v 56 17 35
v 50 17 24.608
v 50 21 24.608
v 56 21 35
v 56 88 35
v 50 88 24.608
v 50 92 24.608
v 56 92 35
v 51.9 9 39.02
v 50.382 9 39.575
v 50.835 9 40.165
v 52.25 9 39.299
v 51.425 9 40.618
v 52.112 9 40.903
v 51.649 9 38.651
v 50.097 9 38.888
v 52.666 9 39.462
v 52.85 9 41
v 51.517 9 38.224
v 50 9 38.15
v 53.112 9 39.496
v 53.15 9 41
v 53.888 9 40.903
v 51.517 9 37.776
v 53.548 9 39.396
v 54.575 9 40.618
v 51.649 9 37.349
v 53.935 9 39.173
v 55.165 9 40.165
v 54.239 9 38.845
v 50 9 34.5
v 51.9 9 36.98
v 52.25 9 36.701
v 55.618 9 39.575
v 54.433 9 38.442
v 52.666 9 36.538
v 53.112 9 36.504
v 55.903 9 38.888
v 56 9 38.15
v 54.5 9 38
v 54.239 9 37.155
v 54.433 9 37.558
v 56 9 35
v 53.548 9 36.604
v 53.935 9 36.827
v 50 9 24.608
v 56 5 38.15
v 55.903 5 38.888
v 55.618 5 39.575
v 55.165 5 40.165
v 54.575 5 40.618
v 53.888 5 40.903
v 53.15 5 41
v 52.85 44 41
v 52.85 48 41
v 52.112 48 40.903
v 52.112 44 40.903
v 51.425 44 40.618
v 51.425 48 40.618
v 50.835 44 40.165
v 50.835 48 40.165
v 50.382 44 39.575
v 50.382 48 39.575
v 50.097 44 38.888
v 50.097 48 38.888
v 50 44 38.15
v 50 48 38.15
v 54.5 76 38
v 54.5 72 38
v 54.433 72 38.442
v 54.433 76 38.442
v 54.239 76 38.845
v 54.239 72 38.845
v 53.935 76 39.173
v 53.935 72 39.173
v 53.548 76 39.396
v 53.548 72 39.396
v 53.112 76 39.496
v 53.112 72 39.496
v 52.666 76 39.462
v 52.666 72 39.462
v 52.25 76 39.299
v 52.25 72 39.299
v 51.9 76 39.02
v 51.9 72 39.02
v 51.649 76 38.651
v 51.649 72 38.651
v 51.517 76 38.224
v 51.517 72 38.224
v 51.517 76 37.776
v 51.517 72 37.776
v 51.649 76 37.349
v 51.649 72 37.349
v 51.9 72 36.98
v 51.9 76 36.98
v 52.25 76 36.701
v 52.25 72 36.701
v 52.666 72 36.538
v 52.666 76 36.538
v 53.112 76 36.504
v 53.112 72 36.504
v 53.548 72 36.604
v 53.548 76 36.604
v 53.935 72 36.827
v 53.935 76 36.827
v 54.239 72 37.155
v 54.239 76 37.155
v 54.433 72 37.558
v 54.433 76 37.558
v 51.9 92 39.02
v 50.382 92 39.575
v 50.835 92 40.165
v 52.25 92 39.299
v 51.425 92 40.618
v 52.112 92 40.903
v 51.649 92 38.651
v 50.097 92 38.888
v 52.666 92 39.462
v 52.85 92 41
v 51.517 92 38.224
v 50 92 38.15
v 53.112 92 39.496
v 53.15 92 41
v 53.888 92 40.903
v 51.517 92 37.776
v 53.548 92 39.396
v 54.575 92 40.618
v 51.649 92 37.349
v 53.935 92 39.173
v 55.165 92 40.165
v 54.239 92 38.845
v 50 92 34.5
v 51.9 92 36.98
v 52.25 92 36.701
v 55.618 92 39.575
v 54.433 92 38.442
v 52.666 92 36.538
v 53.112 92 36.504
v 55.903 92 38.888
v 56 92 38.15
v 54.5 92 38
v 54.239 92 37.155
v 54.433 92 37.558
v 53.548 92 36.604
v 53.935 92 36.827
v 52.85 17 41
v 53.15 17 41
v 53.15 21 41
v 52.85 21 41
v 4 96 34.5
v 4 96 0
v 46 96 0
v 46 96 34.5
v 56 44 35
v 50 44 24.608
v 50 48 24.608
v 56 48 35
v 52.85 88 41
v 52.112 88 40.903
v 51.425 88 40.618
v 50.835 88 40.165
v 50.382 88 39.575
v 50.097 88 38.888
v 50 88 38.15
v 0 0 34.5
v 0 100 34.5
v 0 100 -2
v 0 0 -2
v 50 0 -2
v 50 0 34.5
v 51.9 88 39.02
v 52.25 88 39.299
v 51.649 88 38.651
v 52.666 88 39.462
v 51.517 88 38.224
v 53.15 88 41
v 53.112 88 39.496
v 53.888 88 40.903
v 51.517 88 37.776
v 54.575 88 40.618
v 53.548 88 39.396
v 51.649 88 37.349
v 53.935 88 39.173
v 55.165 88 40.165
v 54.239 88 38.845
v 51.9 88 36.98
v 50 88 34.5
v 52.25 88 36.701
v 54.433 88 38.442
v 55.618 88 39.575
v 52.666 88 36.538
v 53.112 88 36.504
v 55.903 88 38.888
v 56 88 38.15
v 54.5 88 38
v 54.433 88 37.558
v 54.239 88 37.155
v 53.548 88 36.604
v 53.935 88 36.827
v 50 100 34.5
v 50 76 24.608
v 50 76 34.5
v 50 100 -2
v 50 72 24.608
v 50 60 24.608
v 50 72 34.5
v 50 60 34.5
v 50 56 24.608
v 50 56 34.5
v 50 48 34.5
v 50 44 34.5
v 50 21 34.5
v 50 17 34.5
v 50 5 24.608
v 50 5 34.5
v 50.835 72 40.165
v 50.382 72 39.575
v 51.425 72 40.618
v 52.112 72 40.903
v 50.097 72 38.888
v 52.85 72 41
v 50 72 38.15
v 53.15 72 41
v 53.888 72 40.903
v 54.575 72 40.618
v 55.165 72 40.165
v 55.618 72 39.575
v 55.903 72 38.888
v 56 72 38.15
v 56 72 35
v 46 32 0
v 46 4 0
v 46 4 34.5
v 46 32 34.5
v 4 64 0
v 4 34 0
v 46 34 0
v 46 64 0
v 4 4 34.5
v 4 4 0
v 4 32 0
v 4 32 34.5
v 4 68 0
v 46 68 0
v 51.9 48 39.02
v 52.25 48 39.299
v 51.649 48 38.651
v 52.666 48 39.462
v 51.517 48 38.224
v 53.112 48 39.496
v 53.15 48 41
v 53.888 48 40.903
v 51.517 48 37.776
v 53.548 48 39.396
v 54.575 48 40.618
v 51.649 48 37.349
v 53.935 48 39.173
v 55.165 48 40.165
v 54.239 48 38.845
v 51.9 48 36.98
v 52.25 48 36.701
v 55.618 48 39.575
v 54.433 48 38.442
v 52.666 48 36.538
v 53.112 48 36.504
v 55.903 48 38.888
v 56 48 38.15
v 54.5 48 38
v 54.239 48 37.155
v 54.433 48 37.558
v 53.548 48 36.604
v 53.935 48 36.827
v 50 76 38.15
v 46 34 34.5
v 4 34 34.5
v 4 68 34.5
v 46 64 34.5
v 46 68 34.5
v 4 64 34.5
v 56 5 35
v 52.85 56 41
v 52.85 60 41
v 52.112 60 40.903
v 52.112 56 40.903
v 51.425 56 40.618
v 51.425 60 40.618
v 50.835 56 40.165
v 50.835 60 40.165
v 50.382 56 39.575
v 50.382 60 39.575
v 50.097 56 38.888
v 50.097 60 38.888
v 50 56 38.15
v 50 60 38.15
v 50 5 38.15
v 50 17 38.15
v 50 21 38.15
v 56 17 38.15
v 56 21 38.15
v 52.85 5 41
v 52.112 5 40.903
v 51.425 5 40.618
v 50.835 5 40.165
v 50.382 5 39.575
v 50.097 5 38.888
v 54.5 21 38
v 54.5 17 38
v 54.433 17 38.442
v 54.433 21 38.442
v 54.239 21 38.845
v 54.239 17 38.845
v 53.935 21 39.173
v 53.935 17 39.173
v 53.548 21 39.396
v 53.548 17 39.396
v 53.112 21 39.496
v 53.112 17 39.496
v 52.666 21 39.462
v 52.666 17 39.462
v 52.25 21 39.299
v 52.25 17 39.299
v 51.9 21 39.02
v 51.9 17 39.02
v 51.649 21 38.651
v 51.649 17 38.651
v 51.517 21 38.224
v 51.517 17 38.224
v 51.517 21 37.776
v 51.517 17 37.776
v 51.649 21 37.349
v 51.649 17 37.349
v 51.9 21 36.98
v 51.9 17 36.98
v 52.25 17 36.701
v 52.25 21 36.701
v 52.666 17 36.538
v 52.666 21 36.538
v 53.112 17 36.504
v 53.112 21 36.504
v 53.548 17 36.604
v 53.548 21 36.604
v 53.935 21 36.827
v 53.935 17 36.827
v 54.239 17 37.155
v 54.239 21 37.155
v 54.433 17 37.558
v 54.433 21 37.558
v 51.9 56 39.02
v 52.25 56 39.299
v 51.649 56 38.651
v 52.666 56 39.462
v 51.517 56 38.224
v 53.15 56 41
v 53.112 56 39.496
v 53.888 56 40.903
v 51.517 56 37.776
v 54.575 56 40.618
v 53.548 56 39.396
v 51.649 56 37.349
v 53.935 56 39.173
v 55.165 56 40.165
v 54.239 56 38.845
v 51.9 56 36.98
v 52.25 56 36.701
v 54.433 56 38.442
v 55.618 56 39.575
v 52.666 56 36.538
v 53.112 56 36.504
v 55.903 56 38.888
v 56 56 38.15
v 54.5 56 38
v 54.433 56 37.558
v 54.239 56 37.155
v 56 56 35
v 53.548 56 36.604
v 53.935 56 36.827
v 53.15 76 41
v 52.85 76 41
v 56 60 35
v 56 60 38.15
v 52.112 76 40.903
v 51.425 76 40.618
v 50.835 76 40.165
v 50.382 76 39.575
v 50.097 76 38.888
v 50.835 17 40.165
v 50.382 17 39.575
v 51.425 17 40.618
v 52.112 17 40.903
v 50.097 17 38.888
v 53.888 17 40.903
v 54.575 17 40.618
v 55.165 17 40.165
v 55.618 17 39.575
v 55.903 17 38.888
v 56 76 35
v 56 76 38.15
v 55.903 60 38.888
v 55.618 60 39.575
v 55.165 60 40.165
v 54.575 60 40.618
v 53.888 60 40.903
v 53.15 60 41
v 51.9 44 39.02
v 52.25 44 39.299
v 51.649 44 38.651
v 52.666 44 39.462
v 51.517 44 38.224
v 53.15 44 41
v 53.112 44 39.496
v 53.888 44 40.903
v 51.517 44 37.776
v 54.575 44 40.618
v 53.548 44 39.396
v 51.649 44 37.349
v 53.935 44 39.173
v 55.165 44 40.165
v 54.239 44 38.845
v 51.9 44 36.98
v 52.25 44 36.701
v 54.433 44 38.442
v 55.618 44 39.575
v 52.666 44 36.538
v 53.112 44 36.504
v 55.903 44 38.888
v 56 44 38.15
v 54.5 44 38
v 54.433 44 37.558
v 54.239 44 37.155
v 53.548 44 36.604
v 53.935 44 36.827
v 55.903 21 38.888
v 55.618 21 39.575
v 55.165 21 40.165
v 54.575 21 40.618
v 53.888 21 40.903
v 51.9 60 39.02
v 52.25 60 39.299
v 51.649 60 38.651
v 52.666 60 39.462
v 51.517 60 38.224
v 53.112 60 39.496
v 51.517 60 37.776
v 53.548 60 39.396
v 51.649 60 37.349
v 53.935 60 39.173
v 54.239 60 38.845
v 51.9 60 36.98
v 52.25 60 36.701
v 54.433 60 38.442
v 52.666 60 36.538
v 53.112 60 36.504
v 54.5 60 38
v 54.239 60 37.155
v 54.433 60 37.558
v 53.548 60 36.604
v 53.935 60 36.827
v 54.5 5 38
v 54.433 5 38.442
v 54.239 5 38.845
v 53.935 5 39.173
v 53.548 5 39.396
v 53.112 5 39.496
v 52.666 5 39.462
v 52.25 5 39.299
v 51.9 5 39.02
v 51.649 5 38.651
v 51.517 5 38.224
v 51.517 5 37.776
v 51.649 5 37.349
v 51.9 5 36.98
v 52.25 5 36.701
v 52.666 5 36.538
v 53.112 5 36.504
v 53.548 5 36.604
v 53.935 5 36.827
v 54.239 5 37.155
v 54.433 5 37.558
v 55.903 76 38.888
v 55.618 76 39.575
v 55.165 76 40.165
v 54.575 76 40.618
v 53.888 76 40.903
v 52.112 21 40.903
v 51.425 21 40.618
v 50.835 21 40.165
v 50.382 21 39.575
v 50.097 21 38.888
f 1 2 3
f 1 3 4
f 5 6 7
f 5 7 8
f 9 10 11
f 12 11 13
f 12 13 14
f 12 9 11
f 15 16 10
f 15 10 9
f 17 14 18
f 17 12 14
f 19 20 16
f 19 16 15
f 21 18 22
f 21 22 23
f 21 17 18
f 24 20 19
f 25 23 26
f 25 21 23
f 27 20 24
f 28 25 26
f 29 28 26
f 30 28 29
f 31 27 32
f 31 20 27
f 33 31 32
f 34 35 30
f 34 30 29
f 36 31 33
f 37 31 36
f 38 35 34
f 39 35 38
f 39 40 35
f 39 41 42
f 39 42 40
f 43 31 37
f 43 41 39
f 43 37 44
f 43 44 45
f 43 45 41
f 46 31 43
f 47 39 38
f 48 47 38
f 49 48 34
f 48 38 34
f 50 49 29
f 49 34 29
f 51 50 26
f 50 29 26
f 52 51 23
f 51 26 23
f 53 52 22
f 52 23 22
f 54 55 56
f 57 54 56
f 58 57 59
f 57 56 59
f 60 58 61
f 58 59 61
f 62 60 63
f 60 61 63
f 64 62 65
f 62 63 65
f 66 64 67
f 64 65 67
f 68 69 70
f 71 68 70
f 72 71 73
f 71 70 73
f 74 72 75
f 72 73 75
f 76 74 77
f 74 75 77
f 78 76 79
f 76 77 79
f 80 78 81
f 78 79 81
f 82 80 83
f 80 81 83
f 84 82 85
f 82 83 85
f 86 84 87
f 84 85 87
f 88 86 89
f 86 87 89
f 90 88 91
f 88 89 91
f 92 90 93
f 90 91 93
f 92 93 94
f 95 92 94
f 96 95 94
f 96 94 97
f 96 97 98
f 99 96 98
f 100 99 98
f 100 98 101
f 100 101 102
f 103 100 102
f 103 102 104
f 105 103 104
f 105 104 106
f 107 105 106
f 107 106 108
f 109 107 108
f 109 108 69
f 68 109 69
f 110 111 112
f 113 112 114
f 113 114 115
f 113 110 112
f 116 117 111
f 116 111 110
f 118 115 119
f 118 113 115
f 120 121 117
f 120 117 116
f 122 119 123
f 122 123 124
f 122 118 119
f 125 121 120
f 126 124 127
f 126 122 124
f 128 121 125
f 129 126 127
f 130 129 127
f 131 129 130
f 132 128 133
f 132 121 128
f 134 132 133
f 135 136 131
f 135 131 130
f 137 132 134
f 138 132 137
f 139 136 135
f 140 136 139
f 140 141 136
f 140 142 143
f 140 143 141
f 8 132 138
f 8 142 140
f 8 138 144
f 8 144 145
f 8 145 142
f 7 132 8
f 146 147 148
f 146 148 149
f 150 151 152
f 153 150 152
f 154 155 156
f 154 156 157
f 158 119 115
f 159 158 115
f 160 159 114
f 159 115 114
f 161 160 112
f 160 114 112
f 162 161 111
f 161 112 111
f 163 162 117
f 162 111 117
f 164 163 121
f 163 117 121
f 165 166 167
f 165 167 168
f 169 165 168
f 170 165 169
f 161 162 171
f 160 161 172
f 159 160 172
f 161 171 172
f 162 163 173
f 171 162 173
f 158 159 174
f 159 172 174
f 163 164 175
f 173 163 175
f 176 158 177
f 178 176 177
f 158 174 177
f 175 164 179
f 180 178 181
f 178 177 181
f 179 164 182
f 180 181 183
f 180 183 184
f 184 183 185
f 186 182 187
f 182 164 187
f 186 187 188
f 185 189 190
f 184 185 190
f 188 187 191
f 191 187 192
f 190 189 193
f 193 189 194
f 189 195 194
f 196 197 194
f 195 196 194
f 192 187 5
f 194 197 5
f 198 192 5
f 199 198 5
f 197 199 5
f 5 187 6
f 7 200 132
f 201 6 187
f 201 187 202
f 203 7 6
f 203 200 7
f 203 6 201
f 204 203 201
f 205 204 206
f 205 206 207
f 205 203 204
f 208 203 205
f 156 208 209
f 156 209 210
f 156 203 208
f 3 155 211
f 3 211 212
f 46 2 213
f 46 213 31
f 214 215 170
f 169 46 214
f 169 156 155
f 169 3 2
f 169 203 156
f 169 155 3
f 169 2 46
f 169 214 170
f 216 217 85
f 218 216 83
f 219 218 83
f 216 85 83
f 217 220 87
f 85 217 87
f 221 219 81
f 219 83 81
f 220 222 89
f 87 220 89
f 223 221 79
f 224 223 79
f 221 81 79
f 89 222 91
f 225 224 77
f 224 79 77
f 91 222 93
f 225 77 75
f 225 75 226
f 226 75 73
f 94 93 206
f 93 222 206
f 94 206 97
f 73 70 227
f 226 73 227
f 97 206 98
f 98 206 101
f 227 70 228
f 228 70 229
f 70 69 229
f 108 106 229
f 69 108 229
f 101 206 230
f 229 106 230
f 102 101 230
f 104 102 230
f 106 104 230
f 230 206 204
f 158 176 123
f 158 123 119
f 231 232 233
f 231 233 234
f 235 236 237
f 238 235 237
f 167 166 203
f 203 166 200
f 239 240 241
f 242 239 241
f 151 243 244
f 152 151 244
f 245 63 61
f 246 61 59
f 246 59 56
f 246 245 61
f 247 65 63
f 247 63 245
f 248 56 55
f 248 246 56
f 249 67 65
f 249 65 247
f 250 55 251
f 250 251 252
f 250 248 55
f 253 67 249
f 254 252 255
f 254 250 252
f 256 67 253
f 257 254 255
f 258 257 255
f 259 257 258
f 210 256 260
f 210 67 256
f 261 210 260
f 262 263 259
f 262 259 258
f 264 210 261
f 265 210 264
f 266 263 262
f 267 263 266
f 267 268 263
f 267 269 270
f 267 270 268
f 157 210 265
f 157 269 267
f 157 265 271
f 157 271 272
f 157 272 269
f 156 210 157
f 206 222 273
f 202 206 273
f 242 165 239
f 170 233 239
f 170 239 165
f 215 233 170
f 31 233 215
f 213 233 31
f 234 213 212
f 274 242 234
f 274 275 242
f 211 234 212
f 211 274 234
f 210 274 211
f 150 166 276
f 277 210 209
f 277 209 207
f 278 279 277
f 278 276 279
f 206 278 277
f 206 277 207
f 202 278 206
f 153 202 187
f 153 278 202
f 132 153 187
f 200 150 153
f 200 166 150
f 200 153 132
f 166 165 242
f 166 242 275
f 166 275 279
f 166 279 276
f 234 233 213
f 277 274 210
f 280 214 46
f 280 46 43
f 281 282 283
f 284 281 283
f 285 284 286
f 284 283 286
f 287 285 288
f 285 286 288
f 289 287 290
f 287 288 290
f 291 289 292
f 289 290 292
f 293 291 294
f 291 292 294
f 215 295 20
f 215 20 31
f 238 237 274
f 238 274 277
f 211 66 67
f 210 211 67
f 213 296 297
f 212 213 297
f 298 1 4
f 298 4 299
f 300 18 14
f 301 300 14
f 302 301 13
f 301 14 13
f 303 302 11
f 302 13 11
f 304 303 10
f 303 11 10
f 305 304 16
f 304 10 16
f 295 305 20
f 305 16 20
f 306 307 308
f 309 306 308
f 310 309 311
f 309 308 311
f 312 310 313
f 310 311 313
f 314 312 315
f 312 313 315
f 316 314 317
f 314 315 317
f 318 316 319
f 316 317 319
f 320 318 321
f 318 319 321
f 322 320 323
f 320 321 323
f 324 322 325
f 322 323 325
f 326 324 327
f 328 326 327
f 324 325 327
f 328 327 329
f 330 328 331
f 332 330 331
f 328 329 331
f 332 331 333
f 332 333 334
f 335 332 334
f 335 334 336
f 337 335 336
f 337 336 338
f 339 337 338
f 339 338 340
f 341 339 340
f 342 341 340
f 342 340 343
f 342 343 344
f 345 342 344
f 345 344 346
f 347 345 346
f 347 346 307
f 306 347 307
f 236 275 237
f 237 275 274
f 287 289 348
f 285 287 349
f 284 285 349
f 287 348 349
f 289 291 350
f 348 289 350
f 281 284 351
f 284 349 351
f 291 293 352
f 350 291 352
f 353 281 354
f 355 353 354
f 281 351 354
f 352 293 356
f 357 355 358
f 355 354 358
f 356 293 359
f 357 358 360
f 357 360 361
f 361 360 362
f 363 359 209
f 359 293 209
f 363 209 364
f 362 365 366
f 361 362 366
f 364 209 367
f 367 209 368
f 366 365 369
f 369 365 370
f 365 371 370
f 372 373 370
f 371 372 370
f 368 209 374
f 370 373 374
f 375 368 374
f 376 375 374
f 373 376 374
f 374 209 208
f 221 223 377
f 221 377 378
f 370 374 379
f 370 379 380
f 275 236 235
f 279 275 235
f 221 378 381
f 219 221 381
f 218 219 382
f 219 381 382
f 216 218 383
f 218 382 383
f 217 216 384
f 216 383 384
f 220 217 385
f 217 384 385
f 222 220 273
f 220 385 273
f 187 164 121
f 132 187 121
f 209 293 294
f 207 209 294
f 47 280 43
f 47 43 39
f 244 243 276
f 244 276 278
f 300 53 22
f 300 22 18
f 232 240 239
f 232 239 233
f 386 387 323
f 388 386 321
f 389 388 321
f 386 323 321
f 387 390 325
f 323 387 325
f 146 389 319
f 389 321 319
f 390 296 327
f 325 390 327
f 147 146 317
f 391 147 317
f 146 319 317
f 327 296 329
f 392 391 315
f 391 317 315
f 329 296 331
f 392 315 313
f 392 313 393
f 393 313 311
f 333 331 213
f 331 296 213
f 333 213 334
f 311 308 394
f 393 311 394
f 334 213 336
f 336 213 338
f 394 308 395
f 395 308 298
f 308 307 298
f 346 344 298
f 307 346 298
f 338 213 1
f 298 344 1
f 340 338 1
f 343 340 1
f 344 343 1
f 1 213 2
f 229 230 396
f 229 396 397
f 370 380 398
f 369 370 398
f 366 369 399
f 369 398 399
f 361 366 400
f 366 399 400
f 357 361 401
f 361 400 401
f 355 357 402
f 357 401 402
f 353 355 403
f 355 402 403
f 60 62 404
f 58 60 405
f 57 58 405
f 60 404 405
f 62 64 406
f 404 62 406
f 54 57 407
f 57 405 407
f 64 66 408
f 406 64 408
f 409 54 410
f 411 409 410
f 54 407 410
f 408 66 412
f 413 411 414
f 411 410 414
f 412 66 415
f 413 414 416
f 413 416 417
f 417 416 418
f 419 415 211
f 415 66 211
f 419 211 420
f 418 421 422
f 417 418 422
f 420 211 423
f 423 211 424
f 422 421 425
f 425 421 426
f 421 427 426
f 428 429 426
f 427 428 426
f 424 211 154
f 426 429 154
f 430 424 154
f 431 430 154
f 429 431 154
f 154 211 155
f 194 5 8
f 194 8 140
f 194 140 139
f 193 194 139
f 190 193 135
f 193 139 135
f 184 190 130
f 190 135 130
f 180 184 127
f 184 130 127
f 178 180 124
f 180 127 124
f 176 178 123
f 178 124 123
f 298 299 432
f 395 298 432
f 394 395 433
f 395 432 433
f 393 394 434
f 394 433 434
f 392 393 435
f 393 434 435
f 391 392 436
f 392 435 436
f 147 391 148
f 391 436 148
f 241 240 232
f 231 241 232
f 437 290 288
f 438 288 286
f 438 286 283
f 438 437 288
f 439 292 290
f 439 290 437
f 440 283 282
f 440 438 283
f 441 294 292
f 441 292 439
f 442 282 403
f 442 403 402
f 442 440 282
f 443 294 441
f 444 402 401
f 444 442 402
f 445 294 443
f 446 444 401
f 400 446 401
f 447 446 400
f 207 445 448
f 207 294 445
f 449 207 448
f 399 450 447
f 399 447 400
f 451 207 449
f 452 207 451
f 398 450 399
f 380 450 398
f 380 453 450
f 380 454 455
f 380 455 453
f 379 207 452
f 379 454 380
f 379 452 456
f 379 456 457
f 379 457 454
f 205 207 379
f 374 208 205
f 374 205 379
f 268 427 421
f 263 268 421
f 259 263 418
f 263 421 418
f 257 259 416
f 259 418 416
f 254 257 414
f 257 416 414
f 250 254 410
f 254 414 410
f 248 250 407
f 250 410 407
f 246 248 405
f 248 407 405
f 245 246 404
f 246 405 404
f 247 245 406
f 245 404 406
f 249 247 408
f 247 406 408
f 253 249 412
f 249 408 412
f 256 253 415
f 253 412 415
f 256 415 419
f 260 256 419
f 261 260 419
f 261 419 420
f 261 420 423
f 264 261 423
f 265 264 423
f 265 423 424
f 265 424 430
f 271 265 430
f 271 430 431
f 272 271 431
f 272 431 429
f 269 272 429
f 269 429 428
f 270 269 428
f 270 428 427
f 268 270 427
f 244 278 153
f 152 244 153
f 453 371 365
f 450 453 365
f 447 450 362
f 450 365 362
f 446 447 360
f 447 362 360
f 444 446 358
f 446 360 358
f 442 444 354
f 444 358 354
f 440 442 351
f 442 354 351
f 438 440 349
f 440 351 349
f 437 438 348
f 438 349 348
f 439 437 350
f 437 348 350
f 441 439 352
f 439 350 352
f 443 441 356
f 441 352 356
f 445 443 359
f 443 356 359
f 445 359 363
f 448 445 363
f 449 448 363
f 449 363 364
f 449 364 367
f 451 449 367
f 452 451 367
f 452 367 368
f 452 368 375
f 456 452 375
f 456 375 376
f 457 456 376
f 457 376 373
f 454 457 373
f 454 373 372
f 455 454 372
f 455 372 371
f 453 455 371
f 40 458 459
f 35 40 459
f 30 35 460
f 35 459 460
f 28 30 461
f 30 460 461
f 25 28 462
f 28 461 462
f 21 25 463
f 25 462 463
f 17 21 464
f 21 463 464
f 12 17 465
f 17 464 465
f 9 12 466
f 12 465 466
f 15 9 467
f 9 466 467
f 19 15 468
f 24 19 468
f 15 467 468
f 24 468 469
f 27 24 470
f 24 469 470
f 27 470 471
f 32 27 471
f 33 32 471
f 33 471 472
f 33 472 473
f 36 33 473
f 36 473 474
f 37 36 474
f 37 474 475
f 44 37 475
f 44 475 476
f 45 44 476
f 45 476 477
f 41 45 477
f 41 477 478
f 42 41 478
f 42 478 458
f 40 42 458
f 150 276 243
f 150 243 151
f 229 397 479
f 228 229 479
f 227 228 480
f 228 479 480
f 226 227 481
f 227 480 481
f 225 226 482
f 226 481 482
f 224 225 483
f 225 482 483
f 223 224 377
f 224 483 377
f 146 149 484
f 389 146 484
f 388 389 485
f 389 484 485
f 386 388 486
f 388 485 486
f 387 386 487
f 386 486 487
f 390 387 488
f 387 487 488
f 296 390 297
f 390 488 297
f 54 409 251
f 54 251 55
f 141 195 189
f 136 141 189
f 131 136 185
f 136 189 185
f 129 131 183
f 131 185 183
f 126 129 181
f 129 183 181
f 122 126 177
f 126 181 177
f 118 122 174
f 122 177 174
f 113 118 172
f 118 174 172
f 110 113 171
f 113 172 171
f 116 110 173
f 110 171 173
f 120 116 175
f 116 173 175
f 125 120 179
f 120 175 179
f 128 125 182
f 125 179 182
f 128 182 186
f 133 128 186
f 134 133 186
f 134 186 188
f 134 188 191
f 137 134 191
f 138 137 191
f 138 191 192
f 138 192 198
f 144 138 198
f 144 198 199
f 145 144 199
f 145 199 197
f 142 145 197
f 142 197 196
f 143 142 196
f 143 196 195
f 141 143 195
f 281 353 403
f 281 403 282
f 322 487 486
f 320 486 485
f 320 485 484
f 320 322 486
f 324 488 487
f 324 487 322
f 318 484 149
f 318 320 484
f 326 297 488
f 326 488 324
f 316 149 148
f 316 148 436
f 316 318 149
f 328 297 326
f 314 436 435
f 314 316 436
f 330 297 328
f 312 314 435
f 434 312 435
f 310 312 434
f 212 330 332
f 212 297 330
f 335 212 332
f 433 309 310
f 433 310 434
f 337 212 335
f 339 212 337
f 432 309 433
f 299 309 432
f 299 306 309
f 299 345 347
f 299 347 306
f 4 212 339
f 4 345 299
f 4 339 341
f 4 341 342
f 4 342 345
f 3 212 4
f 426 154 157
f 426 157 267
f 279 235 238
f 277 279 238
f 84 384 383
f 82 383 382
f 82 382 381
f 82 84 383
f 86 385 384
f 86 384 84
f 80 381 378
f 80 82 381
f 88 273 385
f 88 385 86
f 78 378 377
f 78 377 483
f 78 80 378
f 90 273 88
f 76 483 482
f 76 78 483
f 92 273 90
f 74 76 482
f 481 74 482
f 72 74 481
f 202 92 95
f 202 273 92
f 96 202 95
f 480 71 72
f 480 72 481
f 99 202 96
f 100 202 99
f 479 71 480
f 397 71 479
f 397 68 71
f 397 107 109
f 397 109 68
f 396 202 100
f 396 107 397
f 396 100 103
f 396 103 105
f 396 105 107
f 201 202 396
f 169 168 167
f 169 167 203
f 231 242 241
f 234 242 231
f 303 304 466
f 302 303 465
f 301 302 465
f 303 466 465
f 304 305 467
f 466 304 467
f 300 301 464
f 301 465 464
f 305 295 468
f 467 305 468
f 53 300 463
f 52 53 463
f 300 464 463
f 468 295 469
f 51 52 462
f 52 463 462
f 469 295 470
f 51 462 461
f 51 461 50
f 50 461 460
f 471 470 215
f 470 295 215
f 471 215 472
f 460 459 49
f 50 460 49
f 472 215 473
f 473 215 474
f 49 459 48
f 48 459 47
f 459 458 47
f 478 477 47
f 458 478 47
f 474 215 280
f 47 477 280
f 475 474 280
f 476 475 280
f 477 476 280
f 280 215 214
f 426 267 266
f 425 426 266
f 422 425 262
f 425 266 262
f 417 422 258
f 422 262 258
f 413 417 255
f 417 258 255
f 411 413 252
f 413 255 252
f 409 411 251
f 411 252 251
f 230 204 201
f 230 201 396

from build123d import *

# Parameters (mm, degrees)
F0_W      = 50
F0_H      = 100
F0_W_2    = 42
F0_H_2    = 60
F0_H_3    = 28
F1_DEPTH  = 35
F2_W      = 50
F2_H      = 100
F3_DEPTH  = 2
F4_R      = 1.5
F5_DEPTH  = 100
F6_R      = 2.85
F7_W      = 15
F7_H      = 5
F7_H_2    = 12
F7_H_3    = 8
F7_H_4    = 23
F8_DEPTH  = 74.9
F9_W      = 42
F9_H      = 60
F9_H_2    = 28
F10_DEPTH = 0.5
F11_W     = 42
F11_H     = 2
F12_DEPTH = 34.5


with BuildPart() as f1:
    # F0 (on Top) → F1 (new body)
    with BuildSketch(Plane.XY):
        with Locations((25, 50)):
            Rectangle(F0_W, F0_H)
        with Locations((25, 34)):
            Rectangle(F0_W_2, F0_H_2, mode=Mode.SUBTRACT)
        with Locations((25, 82)):
            Rectangle(F0_W_2, F0_H_3, mode=Mode.SUBTRACT)
    extrude(amount=F1_DEPTH)

    # F2 (on face) → F3 (join)
    with BuildSketch(Plane(origin=(0, 0, 0), x_dir=(1, 0, 0), z_dir=(0, 0, -1))):
        with Locations((25, -50)):
            Rectangle(F2_W, F2_H)
    extrude(amount=F3_DEPTH)

    # F4 (on face) → F5 (join, through all)
    with BuildSketch(Plane.XZ):
        Polygon((50, 35), (50, 24.607695), (56, 35), (56, 41), (50, 41), align=None)
        with Locations((53, 38)):
            Circle(F4_R, mode=Mode.SUBTRACT)
    extrude(amount=-F5_DEPTH)

    # F6
    f6_edges = [f1.edges().sort_by_distance(p)[0] for p in [
        (56, 50, 41),
        (50, 50, 41),
    ]]
    fillet(f6_edges, radius=F6_R)

    # F7 (on face) → F8 (cut)
    with BuildSketch(Plane(origin=(0, 0, -2), x_dir=(1, 0, 0), z_dir=(0, 0, -1))):
        with Locations((57.5, -2.5)):
            Rectangle(F7_W, F7_H)
        with Locations((57.5, -66)):
            Rectangle(F7_W, F7_H_2)
        with Locations((57.5, -96)):
            Rectangle(F7_W, F7_H_3)
        with Locations((57.5, -82)):
            Rectangle(F7_W, F7_H_2)
        with Locations((57.5, -52)):
            Rectangle(F7_W, F7_H_3)
        with Locations((57.5, -13)):
            Rectangle(F7_W, F7_H_3)
        with Locations((57.5, -32.5)):
            Rectangle(F7_W, F7_H_4)
    extrude(amount=-F8_DEPTH, mode=Mode.SUBTRACT)

    # F9 (on face) → F10 (cut)
    with BuildSketch(Plane.XY.offset(35)):
        Polygon((0, 100), (0, 0), (50, 0), (50, 5), (50, 9), (50, 17), (50, 21), (50, 44), (50, 48), (50, 56), (50, 60), (50, 72), (50, 76), (50, 88), (50, 92), (50, 100), align=None)
        with Locations((25, 34)):
            Rectangle(F9_W, F9_H, mode=Mode.SUBTRACT)
        with Locations((25, 82)):
            Rectangle(F9_W, F9_H_2, mode=Mode.SUBTRACT)
    extrude(amount=-F10_DEPTH, mode=Mode.SUBTRACT)

    # F11 (on face) → F12 (join, through all)
    with BuildSketch(Plane.XY.offset(34.5)):
        with Locations((25, 33)):
            Rectangle(F11_W, F11_H)
    extrude(amount=-F12_DEPTH)


solid = f1.part
